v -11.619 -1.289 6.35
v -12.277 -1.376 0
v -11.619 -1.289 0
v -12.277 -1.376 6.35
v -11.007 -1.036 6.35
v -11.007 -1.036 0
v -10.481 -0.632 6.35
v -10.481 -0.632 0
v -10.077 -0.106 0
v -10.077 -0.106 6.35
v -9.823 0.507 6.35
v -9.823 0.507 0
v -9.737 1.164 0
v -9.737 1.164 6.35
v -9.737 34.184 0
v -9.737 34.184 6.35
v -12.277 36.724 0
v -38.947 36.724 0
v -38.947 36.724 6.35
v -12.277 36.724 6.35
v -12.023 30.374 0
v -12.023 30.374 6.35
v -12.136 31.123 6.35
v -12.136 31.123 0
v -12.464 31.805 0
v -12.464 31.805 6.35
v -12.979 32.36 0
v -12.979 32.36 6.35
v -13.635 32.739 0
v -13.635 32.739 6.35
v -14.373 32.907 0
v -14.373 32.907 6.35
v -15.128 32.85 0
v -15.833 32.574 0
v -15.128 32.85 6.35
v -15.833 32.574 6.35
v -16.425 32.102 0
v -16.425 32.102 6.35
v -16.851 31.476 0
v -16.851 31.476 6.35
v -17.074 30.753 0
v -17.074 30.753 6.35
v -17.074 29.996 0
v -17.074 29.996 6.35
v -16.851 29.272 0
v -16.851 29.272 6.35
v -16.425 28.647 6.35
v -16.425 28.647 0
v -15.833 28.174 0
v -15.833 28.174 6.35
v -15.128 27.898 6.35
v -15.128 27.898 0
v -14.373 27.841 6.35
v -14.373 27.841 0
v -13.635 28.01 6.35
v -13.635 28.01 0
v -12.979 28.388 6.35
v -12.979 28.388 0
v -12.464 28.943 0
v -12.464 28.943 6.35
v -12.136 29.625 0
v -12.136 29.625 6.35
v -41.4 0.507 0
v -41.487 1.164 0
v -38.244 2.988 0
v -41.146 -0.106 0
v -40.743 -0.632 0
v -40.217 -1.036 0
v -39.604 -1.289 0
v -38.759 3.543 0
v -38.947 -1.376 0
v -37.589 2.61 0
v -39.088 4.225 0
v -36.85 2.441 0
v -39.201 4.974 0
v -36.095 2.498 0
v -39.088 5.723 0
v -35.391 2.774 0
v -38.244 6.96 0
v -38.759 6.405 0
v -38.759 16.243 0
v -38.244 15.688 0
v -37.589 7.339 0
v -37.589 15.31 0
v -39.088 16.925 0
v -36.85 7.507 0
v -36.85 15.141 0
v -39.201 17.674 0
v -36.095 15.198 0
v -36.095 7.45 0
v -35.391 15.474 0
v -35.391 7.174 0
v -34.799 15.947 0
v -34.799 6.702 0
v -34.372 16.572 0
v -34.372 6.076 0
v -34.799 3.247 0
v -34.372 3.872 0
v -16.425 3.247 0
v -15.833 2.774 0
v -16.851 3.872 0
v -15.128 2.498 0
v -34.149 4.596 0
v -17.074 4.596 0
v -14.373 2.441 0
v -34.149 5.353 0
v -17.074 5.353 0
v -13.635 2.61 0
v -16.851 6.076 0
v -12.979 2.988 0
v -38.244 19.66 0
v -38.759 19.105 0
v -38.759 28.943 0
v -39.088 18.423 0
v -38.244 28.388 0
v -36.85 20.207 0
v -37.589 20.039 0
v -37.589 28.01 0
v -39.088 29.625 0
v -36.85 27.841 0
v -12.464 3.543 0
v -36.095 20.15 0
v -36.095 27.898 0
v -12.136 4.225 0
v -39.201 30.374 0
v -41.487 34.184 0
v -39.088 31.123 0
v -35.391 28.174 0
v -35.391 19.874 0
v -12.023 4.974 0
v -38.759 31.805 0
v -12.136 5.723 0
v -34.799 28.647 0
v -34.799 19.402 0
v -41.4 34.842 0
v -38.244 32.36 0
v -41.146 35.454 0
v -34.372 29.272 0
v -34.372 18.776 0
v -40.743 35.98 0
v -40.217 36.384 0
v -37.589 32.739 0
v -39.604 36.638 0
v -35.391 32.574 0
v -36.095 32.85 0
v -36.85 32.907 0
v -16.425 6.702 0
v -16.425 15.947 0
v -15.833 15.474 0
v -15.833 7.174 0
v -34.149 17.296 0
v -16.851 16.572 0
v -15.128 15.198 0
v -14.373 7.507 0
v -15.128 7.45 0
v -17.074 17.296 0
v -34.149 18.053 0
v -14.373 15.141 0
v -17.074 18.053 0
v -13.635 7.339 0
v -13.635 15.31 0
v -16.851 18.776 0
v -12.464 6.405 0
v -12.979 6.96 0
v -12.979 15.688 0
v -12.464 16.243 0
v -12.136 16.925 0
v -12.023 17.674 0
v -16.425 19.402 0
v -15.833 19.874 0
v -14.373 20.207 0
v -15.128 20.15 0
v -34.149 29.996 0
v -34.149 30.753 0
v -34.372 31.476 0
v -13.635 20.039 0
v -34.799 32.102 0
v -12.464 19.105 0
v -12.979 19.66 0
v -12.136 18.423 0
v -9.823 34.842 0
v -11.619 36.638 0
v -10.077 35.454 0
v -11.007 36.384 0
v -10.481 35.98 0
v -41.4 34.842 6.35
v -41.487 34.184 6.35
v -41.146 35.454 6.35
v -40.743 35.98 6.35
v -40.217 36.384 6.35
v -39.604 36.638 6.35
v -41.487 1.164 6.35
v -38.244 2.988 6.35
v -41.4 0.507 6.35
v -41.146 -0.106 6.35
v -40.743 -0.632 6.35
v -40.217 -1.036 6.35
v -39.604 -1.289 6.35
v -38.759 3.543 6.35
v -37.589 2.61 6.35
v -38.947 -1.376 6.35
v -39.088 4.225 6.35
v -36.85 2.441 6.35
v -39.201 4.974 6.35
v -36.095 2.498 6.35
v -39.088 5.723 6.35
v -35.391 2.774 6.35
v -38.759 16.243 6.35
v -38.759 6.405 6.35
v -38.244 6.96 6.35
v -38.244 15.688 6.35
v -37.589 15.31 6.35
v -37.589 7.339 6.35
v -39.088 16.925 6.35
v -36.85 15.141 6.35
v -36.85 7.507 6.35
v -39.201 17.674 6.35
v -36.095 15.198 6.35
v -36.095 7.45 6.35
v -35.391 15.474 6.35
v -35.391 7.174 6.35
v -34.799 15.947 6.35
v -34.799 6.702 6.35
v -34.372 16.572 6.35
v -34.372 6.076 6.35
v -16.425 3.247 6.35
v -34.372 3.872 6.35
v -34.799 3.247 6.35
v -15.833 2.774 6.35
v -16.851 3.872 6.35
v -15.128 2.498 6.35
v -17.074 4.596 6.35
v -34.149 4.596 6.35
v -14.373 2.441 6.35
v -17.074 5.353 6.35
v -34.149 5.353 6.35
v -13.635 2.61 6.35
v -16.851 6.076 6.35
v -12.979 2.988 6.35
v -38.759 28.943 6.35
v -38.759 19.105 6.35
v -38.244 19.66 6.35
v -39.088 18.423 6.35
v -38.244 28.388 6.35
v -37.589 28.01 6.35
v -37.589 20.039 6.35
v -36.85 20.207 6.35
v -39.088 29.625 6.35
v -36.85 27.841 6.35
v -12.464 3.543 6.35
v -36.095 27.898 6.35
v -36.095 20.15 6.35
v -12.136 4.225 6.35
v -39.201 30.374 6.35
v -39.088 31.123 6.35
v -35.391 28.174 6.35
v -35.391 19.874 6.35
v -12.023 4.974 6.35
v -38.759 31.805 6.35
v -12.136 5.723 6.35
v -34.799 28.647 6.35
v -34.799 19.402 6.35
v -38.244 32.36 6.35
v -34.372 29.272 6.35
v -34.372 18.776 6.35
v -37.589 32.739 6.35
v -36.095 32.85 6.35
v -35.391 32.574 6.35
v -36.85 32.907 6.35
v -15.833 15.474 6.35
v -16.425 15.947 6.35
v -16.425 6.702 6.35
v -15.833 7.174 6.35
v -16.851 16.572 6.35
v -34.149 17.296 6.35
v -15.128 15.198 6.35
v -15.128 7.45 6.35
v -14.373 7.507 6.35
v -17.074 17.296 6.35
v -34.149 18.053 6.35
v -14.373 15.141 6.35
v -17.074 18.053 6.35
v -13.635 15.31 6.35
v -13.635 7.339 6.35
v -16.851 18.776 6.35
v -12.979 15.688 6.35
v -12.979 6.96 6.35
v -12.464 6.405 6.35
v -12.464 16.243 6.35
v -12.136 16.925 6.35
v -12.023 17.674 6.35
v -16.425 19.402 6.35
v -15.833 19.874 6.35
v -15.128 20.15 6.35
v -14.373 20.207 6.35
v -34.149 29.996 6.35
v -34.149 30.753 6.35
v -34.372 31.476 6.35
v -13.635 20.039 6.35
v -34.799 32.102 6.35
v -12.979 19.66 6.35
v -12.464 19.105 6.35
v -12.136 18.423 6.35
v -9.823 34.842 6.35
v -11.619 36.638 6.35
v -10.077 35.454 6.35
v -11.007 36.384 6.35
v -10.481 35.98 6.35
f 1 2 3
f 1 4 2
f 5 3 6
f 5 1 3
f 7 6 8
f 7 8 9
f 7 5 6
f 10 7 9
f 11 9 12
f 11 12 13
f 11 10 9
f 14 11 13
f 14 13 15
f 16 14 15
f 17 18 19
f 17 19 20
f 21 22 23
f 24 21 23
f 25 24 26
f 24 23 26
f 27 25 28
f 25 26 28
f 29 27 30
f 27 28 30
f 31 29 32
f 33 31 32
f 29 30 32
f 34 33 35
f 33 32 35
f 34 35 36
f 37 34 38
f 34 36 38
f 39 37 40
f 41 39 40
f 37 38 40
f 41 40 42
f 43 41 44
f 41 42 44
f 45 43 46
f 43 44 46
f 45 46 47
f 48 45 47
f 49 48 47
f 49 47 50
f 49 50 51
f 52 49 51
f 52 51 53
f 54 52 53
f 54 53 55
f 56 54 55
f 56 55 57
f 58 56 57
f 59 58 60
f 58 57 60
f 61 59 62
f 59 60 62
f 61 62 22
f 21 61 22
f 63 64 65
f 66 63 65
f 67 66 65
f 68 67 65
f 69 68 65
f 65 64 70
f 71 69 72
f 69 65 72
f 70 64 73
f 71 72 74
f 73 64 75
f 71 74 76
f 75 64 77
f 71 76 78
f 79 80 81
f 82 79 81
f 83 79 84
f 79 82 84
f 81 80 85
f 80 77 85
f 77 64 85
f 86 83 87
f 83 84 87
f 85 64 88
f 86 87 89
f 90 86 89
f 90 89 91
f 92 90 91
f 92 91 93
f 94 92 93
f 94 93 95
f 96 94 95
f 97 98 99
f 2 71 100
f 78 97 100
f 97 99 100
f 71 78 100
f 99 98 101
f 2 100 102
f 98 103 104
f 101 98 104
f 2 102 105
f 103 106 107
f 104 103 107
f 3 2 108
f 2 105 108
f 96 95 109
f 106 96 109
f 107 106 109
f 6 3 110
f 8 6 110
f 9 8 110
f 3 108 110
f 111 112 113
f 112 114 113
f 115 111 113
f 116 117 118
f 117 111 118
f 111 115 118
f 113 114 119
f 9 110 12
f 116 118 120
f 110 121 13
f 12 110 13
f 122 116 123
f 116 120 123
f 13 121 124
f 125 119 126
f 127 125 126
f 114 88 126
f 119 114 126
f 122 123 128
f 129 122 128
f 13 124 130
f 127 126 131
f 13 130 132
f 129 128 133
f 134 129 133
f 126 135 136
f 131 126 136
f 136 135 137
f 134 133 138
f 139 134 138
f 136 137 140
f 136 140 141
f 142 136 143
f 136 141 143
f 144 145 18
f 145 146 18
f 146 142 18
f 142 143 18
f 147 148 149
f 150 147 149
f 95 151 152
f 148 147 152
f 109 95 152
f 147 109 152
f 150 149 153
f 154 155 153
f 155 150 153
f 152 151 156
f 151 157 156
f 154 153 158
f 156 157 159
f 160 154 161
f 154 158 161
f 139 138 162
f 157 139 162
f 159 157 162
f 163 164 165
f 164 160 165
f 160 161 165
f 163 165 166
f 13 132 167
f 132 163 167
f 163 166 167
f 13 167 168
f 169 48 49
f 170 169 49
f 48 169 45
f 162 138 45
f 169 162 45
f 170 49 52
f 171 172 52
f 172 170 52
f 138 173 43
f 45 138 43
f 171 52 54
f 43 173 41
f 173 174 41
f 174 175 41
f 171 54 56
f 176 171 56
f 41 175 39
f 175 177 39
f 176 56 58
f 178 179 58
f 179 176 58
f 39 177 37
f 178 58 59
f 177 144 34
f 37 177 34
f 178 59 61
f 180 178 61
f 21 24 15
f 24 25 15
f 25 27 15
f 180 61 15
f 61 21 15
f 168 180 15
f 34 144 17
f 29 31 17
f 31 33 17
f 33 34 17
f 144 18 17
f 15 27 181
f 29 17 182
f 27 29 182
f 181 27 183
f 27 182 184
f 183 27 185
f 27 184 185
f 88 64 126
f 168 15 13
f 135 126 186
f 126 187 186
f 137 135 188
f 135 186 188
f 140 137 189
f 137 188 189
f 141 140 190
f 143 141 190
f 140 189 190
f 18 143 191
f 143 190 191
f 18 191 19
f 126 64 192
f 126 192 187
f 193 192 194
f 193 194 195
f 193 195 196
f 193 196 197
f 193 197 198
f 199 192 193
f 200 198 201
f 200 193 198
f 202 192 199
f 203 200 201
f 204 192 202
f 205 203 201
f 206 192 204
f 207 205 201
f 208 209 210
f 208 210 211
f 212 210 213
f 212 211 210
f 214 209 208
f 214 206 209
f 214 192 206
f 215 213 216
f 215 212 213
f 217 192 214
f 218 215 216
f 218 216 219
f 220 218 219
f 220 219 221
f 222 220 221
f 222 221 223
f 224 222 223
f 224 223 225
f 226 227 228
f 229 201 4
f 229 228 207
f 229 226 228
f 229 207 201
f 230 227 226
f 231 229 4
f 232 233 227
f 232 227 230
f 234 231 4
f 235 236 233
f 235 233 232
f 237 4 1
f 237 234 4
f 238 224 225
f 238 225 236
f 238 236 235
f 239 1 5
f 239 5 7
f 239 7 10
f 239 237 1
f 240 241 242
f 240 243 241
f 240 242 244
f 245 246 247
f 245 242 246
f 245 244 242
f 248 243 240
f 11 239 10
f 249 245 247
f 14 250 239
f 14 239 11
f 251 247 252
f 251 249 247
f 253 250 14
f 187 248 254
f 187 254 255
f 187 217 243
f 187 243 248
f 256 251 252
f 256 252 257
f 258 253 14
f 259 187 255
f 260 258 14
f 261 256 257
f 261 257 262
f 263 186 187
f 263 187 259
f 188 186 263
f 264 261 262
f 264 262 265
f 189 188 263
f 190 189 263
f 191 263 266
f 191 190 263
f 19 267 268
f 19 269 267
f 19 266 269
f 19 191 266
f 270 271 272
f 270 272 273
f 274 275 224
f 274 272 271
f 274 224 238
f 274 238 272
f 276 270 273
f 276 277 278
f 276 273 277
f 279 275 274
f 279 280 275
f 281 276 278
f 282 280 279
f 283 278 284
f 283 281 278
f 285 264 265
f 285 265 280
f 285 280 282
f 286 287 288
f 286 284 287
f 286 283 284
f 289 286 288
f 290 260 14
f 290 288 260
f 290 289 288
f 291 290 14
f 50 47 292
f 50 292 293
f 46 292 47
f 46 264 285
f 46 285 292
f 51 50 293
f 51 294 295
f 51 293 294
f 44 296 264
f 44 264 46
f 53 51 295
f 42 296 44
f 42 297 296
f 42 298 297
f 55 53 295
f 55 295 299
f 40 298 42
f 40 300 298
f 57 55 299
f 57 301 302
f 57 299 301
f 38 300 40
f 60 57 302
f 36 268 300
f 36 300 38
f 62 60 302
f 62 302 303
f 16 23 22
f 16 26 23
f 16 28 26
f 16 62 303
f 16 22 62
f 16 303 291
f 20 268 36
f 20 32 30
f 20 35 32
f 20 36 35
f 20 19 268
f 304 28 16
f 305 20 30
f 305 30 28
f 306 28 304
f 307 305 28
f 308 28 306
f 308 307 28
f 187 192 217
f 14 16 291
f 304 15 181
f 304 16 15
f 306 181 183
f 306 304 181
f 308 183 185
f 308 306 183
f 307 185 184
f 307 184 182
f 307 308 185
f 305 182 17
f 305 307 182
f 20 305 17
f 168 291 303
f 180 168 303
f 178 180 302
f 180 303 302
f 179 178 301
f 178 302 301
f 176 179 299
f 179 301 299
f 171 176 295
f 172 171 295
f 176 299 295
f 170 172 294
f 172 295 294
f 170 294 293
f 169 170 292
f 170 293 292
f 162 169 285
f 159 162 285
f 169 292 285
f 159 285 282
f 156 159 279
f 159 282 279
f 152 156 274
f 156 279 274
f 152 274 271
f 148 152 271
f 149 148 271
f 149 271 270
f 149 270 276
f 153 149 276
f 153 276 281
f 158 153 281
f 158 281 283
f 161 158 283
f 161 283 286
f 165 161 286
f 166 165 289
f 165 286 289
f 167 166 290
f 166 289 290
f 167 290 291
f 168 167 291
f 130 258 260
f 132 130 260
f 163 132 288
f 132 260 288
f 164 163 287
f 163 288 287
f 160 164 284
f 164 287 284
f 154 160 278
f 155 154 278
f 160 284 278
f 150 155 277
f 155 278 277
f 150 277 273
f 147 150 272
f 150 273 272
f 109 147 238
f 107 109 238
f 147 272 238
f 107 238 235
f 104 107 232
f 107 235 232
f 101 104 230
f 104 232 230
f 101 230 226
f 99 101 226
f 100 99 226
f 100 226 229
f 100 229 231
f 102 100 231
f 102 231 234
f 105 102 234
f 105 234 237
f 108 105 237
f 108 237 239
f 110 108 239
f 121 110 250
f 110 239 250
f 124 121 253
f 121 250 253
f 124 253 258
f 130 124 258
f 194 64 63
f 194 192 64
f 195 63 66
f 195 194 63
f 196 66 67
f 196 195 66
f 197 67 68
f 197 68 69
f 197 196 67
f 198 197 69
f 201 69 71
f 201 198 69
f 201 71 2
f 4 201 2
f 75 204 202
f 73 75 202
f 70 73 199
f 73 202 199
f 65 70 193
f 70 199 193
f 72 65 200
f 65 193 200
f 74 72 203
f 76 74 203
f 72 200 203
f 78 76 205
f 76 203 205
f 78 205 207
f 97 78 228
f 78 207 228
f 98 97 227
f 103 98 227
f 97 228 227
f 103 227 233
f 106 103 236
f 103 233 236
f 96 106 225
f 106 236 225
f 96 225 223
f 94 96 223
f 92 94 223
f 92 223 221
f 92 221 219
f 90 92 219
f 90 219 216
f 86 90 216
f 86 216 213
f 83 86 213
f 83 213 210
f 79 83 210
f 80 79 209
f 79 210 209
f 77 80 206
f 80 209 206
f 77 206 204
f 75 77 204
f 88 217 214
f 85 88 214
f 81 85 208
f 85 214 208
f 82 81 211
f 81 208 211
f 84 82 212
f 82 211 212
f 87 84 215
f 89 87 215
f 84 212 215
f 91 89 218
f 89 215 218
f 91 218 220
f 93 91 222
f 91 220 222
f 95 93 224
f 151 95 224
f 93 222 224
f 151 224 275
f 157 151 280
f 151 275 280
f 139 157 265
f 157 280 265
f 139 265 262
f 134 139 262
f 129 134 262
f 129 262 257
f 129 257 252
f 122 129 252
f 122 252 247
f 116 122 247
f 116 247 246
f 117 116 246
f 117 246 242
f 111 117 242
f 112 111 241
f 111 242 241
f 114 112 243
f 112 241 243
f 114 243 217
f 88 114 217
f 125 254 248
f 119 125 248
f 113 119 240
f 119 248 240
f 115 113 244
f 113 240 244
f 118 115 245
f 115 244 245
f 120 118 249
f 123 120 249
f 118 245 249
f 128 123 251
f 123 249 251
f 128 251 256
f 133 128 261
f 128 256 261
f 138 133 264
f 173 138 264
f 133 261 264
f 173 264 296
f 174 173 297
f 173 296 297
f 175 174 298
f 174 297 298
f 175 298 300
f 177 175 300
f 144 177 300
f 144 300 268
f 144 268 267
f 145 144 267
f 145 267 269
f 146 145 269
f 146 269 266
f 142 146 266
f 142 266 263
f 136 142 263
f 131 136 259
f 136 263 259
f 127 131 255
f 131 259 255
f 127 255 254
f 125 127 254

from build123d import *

# Parameters (mm, degrees)
SKETCH1_W           = 31.75
SKETCH1_H           = 38.1
BOSS_EXTRUDE1_DEPTH = 6.35
FILLET1_R           = 2.54
SKETCH4_R           = 2.54
CUT_EXTRUDE1_DEPTH  = 6.35


with BuildPart() as part:
    # Sketch1 → Boss-Extrude1 (new body)
    with BuildSketch(Plane.XY):
        with Locations((-25.611666667, 17.674166667)):
            Rectangle(SKETCH1_W, SKETCH1_H)
    extrude(amount=BOSS_EXTRUDE1_DEPTH)

    # Fillet1
    fillet1_edges = [part.edges().sort_by_distance(p)[0] for p in [
        (-9.736666667, 36.724166667, 3.175),
        (-9.736666667, -1.375833333, 3.175),
        (-41.486666667, -1.375833333, 3.175),
        (-41.486666667, 36.724166667, 3.175),
    ]]
    fillet(fillet1_edges, radius=FILLET1_R)

    # Sketch4 → Cut-Extrude1 (cut)
    with BuildSketch(Plane.XY.offset(6.35)):
        with Locations((-14.562666667, 30.374166667)):
            Circle(SKETCH4_R)
        with Locations((-14.562666667, 17.674166667)):
            Circle(SKETCH4_R)
        with Locations((-14.562666667, 4.974166667)):
            Circle(SKETCH4_R)
        with Locations(Location((-36.660666667, 4.974166667, 0), (0, 0, 180))):
            Circle(SKETCH4_R)
        with Locations(Location((-36.660666667, 17.674166667, 0), (0, 0, 180))):
            Circle(SKETCH4_R)
        with Locations(Location((-36.660666667, 30.374166667, 0), (0, 0, 180))):
            Circle(SKETCH4_R)
    extrude(amount=-CUT_EXTRUDE1_DEPTH, mode=Mode.SUBTRACT)


solid = part.part
